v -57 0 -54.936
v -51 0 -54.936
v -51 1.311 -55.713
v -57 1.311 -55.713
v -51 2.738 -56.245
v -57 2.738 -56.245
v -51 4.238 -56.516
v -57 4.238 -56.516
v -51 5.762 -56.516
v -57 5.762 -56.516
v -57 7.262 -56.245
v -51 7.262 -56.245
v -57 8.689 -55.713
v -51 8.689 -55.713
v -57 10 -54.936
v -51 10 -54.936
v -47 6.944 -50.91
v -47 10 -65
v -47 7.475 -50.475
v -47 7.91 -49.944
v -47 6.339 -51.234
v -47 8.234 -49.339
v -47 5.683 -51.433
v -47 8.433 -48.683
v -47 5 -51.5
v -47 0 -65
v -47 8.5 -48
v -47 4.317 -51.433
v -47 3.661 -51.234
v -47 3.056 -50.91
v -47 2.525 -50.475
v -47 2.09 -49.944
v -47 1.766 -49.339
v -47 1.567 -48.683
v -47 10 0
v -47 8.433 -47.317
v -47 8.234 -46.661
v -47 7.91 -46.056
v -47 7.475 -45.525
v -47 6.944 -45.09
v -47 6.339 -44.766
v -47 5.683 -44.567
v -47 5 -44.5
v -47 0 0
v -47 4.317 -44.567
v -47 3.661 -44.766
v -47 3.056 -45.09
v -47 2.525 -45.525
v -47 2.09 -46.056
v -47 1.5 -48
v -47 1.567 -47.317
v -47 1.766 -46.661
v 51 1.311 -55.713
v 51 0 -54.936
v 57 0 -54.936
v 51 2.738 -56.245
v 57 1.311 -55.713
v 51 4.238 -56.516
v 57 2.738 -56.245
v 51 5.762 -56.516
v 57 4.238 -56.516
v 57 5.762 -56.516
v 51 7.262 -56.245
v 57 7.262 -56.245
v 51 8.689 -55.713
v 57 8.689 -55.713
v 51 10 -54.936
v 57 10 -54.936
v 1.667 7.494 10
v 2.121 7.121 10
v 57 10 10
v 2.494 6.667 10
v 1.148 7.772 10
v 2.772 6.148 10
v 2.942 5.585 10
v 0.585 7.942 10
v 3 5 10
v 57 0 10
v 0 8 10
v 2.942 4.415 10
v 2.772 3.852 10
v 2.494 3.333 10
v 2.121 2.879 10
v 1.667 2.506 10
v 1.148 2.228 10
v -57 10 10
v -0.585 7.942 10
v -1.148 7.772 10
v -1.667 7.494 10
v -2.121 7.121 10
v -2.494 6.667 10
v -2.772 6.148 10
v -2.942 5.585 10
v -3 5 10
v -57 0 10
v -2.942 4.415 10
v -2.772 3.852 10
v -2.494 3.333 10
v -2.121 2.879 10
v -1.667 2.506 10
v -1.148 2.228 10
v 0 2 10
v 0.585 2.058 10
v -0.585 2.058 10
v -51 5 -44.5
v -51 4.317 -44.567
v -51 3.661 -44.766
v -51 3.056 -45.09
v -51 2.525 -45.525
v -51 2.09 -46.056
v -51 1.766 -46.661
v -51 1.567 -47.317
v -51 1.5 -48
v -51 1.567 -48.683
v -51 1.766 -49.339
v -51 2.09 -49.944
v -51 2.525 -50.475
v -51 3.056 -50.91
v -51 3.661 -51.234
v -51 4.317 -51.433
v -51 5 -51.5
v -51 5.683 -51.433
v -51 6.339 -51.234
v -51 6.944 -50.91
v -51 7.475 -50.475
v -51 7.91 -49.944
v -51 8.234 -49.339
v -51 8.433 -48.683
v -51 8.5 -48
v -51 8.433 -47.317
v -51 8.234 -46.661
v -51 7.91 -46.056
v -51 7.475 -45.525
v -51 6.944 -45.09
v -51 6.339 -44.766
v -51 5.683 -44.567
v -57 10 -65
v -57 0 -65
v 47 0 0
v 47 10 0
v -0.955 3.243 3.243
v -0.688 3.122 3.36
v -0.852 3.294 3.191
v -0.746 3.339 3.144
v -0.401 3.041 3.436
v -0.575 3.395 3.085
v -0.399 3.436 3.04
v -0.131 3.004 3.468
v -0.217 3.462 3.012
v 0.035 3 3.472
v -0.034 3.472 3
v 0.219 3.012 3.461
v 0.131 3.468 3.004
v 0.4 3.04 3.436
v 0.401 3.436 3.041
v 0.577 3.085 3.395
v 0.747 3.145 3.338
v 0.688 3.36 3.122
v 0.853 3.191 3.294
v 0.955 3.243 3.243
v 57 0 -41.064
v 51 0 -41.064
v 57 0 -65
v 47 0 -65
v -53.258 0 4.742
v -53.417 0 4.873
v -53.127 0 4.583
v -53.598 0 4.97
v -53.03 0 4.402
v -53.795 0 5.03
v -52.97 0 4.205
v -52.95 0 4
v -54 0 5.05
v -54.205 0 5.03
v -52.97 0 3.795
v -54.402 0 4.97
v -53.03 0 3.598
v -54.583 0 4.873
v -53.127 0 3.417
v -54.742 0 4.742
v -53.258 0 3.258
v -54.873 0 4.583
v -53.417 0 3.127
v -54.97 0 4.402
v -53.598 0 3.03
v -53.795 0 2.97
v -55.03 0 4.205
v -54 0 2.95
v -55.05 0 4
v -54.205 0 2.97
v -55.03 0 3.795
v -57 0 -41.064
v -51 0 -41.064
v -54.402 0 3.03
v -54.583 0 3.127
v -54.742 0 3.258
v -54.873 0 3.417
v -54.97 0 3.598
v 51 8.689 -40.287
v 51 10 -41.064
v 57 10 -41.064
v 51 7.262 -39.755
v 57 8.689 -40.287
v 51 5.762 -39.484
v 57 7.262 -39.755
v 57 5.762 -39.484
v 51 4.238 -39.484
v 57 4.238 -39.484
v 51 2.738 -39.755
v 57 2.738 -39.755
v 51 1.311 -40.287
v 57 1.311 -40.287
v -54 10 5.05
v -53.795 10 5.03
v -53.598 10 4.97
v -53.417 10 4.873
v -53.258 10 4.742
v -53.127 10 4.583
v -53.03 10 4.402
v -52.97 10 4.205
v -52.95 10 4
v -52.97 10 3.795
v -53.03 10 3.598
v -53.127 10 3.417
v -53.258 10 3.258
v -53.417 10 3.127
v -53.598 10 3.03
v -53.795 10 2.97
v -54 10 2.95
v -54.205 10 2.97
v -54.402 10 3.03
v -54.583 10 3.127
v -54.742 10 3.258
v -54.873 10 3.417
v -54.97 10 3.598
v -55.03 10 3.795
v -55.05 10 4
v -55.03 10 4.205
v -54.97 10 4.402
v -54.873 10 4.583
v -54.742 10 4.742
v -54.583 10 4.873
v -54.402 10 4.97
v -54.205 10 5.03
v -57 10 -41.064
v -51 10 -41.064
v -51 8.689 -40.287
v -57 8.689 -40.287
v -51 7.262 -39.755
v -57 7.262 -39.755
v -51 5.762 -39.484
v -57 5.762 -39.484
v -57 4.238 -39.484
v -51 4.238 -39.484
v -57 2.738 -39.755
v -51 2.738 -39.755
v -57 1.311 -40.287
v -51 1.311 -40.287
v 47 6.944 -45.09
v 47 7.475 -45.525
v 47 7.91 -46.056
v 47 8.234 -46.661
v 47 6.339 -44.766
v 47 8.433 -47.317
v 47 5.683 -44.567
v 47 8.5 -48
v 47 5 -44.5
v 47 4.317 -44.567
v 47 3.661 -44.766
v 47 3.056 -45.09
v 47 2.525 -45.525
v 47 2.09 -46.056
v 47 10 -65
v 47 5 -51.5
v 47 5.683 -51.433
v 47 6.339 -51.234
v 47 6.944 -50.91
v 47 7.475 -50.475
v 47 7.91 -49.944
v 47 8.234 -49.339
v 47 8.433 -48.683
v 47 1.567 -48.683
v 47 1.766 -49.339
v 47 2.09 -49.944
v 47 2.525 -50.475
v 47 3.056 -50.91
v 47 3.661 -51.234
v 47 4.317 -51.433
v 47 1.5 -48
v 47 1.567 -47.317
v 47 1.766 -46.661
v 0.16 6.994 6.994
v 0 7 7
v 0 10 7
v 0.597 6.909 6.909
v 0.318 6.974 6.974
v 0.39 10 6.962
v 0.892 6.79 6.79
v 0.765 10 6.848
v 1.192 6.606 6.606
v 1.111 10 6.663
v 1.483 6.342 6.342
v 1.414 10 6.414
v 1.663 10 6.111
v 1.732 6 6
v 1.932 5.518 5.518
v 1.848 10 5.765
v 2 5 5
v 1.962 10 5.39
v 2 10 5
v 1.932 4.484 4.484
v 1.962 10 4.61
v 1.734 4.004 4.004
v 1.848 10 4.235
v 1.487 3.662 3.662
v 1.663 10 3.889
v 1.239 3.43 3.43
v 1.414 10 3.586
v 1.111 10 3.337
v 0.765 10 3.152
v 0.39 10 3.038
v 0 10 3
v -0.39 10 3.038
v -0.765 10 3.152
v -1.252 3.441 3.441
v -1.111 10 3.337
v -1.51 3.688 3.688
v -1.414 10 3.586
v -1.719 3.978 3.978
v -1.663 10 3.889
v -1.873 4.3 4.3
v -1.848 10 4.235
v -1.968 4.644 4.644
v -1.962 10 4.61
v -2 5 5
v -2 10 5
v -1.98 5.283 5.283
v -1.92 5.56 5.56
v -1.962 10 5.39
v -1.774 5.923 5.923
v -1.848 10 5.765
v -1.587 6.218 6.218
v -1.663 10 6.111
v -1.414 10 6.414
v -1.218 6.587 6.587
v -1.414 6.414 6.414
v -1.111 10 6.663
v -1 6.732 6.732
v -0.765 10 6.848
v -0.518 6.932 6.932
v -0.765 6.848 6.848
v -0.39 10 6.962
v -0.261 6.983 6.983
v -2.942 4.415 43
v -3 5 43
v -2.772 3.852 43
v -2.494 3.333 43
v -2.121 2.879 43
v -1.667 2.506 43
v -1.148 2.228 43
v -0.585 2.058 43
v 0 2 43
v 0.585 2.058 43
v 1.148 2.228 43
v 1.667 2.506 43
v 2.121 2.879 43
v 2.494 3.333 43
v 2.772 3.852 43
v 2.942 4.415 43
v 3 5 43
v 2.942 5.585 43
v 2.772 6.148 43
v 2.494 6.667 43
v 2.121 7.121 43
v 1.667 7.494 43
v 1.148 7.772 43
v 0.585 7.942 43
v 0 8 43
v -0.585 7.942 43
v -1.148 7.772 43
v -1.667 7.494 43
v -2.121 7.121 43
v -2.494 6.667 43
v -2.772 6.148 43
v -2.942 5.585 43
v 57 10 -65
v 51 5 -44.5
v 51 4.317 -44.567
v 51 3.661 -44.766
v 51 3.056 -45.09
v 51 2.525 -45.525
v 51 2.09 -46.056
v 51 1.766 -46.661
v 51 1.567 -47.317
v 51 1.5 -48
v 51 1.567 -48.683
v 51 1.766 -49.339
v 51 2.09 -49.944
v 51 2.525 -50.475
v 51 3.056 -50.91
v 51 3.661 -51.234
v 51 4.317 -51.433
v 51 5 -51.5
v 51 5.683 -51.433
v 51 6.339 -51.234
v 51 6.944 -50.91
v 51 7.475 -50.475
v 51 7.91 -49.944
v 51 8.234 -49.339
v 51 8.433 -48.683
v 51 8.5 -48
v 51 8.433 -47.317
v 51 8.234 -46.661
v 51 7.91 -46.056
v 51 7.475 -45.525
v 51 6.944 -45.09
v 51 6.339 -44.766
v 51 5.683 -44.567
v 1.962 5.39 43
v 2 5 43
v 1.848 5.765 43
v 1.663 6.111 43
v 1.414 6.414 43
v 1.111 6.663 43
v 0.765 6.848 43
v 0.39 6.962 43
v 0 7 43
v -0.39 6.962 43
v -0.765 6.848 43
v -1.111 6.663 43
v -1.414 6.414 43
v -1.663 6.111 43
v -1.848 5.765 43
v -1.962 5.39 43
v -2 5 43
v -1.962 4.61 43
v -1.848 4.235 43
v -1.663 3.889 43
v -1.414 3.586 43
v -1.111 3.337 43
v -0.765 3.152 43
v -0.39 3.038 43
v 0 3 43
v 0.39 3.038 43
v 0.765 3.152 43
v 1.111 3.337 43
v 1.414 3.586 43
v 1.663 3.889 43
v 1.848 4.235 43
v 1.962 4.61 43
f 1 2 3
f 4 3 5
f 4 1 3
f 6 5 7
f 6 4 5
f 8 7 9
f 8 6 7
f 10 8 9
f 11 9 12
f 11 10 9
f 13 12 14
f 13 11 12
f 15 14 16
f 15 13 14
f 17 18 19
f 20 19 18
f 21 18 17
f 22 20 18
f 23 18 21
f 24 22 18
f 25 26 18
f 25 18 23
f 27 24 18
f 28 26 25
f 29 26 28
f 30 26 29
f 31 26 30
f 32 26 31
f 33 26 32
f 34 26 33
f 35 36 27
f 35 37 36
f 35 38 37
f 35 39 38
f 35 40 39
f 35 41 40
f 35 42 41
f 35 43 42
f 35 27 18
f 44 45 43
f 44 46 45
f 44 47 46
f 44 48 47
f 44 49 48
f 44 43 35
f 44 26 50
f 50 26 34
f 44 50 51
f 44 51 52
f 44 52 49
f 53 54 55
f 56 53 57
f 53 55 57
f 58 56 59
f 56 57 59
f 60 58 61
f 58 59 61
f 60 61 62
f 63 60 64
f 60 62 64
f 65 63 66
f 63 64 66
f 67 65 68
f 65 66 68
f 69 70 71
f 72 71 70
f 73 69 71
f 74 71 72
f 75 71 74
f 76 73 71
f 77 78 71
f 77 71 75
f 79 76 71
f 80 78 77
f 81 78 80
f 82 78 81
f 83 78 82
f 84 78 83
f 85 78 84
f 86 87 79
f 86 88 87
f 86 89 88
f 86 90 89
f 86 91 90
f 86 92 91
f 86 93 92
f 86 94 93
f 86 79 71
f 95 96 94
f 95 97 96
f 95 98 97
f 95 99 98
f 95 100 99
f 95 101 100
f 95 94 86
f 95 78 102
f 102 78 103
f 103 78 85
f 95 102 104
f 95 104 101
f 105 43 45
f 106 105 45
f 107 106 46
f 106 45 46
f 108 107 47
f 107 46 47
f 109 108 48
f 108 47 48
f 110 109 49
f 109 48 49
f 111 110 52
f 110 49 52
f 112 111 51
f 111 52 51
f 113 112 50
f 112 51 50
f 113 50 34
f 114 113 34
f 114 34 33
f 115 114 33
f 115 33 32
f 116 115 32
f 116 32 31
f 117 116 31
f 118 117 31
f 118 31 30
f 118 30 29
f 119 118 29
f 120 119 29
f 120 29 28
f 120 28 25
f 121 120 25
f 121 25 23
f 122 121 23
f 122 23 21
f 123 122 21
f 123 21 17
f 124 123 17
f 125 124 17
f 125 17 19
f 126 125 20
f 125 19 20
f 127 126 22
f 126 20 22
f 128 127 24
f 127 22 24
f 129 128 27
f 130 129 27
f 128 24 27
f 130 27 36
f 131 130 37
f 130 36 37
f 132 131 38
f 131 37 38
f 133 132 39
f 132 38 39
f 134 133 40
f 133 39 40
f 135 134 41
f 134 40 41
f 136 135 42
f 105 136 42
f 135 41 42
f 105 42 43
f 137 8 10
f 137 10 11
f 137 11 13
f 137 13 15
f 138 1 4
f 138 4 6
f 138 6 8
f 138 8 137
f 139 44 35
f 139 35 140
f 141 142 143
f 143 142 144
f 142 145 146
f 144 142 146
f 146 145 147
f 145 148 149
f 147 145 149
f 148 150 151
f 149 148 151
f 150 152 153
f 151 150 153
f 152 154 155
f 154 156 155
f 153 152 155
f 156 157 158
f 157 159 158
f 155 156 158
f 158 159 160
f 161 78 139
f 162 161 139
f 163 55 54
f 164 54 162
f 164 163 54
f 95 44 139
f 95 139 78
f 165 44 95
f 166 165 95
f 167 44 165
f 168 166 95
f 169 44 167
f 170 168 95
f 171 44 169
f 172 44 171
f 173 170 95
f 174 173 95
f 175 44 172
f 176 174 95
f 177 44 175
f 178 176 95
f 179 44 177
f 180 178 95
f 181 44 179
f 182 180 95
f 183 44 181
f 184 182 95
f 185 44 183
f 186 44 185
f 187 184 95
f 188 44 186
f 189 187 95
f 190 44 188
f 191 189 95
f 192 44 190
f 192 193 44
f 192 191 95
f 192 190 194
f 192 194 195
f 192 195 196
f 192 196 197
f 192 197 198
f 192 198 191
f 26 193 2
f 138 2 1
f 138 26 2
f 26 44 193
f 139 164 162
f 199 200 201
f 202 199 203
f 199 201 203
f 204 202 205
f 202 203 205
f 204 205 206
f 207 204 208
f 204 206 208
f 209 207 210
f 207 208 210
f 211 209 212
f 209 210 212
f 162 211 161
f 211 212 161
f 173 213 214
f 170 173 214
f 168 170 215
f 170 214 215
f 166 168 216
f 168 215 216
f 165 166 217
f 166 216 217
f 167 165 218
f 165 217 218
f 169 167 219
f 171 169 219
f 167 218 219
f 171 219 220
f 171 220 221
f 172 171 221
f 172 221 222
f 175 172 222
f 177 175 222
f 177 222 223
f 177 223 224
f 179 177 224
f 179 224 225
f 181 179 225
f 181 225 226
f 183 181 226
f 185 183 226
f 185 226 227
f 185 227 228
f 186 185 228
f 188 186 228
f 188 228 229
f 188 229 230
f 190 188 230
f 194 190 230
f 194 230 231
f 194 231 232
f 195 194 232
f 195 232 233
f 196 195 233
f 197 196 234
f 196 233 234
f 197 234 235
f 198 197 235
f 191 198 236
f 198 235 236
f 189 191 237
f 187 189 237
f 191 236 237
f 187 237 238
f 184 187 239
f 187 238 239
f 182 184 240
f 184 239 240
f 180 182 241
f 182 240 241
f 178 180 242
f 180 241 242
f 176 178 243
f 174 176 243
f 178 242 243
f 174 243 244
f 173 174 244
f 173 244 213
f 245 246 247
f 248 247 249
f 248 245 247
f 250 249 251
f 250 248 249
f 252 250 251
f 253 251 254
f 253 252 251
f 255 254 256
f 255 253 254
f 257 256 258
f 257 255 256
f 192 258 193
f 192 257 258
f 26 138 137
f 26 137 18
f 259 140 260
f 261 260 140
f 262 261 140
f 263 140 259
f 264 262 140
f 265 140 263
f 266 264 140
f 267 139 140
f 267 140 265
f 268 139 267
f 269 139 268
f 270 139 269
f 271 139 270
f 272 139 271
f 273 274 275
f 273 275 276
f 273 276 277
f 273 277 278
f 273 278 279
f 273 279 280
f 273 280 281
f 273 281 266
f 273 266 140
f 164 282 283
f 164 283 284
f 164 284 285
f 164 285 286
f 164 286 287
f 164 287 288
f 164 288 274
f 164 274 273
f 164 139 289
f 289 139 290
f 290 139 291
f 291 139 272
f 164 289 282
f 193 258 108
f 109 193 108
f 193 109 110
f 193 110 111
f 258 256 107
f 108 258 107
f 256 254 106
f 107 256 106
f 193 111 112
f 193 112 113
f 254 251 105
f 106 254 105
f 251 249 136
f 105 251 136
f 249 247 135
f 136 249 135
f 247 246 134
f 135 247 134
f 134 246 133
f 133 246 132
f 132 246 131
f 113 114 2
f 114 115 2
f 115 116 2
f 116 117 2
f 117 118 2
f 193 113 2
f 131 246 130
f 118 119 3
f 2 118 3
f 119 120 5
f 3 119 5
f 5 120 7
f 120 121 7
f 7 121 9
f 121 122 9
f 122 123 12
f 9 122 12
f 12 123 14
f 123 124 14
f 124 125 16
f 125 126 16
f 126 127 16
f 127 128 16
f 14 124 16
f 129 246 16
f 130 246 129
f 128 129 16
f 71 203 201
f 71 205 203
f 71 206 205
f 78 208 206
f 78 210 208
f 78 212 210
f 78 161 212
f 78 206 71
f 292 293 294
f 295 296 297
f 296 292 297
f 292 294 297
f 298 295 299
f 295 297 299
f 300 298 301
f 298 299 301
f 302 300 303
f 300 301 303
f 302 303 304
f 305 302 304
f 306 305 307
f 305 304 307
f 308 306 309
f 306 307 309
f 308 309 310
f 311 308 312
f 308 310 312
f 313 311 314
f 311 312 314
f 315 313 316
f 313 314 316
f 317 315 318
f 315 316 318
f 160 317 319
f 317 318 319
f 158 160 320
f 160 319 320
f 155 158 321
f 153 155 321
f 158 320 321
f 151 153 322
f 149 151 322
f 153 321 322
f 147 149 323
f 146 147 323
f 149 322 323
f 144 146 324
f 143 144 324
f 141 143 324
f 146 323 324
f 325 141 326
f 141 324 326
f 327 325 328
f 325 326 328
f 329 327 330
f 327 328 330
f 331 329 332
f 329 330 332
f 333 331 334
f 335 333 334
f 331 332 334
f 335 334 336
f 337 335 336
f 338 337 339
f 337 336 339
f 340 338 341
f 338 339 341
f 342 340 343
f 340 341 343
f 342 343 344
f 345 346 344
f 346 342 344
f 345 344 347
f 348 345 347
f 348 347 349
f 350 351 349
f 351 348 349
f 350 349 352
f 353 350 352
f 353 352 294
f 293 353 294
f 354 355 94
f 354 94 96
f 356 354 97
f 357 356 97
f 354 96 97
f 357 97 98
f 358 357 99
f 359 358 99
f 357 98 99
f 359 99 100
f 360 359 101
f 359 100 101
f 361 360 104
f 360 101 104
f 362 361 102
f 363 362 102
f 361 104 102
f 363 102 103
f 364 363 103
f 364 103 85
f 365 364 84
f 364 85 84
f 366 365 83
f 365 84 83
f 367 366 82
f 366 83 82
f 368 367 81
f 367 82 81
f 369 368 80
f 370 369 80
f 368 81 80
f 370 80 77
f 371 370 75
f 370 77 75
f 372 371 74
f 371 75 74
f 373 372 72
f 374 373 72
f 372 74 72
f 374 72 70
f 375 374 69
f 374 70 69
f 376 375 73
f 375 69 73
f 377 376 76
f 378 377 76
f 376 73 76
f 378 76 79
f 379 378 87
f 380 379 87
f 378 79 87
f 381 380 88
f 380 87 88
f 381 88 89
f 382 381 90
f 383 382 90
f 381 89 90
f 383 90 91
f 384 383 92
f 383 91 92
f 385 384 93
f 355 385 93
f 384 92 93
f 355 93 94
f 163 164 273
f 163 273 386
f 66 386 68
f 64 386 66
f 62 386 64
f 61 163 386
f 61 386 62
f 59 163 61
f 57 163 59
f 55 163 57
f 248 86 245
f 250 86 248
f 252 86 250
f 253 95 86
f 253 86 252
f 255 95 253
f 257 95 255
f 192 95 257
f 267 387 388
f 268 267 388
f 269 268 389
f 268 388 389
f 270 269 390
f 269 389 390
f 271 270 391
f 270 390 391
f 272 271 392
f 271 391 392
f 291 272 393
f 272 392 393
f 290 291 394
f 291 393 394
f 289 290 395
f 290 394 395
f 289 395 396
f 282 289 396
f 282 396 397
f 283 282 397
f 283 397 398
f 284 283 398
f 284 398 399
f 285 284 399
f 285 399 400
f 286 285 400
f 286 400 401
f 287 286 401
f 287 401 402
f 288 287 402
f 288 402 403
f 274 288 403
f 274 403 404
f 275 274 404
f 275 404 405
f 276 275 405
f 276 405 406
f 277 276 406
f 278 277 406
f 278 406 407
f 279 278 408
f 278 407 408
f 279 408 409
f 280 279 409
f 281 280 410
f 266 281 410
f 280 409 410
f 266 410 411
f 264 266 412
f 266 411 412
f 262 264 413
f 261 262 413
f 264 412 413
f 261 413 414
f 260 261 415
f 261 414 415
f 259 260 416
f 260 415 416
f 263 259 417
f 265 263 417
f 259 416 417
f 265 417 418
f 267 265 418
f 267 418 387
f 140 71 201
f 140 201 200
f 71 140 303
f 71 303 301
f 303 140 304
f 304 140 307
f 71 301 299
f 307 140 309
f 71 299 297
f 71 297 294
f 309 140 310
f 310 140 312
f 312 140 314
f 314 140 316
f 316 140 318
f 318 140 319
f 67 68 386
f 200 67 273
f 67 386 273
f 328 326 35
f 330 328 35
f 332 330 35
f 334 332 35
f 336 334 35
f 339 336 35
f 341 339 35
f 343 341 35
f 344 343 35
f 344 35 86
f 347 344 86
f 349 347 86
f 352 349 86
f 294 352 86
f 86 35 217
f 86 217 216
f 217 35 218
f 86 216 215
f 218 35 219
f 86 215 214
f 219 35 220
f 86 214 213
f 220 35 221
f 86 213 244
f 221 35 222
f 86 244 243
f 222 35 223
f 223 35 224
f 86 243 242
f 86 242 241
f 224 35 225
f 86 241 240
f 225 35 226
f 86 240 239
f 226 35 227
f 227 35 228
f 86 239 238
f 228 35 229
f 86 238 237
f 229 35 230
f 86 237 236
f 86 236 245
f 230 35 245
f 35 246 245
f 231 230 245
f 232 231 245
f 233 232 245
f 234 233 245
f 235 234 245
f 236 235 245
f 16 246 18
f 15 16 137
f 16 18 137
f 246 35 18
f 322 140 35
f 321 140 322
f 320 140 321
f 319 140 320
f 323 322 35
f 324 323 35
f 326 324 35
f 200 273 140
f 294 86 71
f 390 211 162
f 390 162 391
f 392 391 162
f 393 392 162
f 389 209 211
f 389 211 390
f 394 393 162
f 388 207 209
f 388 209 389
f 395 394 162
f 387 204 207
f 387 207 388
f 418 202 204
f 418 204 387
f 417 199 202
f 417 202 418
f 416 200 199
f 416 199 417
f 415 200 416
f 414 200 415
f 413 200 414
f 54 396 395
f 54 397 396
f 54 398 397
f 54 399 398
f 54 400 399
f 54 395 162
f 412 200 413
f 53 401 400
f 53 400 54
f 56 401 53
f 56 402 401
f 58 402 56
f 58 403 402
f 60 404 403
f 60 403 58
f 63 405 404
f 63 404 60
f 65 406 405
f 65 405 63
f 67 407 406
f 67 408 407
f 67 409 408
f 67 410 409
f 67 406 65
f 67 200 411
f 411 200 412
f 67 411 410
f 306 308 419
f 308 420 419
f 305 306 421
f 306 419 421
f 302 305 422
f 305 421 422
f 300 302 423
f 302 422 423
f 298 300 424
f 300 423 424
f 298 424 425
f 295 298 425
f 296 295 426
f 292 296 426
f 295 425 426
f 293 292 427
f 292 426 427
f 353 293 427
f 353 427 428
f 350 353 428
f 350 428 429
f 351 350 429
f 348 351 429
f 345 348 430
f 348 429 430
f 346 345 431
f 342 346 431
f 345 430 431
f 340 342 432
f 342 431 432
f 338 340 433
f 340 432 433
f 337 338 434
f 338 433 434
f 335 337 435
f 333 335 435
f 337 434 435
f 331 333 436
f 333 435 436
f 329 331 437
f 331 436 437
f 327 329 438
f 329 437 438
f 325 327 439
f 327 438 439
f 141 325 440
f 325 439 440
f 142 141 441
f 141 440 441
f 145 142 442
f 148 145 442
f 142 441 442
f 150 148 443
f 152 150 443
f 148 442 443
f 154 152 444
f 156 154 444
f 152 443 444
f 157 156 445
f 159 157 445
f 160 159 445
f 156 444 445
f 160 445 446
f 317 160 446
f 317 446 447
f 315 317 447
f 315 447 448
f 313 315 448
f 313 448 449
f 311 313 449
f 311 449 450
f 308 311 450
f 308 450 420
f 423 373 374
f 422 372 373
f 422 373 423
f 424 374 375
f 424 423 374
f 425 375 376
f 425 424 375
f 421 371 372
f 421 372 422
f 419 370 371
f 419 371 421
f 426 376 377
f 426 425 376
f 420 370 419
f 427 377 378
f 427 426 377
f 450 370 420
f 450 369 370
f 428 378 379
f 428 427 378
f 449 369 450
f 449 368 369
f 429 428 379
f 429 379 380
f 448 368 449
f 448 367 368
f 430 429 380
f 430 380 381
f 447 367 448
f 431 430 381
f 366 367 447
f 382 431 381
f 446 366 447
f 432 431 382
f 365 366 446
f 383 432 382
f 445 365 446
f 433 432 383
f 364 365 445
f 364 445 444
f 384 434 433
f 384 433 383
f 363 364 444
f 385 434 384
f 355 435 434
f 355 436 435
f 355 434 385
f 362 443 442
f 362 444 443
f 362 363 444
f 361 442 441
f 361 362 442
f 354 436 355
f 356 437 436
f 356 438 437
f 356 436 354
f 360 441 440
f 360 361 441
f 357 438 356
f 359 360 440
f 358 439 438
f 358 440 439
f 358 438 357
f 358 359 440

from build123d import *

# Parameters (mm, degrees)
BOSS_EXTRUDE1_DEPTH = 10
SKETCH2_R           = 8.55
CUT_EXTRUDE1_DEPTH  = 6
SKETCH3_R           = 3.5
CUT_EXTRUDE2_DEPTH  = 127.447617613
SKETCH4_R           = 3
BOSS_EXTRUDE2_DEPTH = 33
SKETCH5_R           = 1.05
CUT_EXTRUDE3_DEPTH  = 88.028730888
SKETCH6_R           = 2
CUT_EXTRUDE4_DEPTH  = 38
SKETCH7_R           = 2
CUT_EXTRUDE5_DEPTH  = 5
FILLET2_R           = 6


with BuildPart() as part:
    # Sketch1 → Boss-Extrude1 (new body)
    with BuildSketch(Plane(origin=(0, 0, 0), x_dir=(1, 0, 0), z_dir=(0, 1, 0))):
        Polygon((-47, 0), (47, 0), (47, 65), (57, 65), (57, -10), (-57, -10), (-57, 65), (-47, 65), align=None)
    extrude(amount=BOSS_EXTRUDE1_DEPTH)

    # Sketch2 → Cut-Extrude1 (cut)
    with BuildSketch(Plane(origin=(57, 0, 0), x_dir=(0, 0, -1), z_dir=(1, 0, 0))):
        with Locations((48, 5)):
            Circle(SKETCH2_R)
    cut_extrude1 = extrude(amount=-CUT_EXTRUDE1_DEPTH, mode=Mode.SUBTRACT)

    # Mirror1: Cut-Extrude1 across plane
    add(cut_extrude1.mirror(Plane(origin=(0, 0, 0), x_dir=(0, 0, 1), z_dir=(1, 0, 0))), mode=Mode.SUBTRACT)

    # Sketch3 → Cut-Extrude2 (cut, through all)
    with BuildSketch(Plane(origin=(51, 0, 0), x_dir=(0, 0, -1), z_dir=(1, 0, 0))):
        with Locations(Location((48, 5, 0), (0, 0, 180))):
            Circle(SKETCH3_R)
    extrude(amount=-CUT_EXTRUDE2_DEPTH, mode=Mode.SUBTRACT)

    # Sketch4 → Boss-Extrude2 (add)
    with BuildSketch(Plane.XY.offset(10)):
        with Locations(Location((0, 5, 0), (0, 0, 180))):
            Circle(SKETCH4_R)
    extrude(amount=BOSS_EXTRUDE2_DEPTH)

    # Sketch5 → Cut-Extrude3 (cut, through all)
    with BuildSketch(Plane(origin=(0, 10, 0), x_dir=(1, 0, 0), z_dir=(0, 1, 0))):
        with Locations(Location((-54, -4, 0), (0, 0, 270))):
            Circle(SKETCH5_R)
    extrude(amount=-CUT_EXTRUDE3_DEPTH, mode=Mode.SUBTRACT)

    # Sketch6 → Cut-Extrude4 (cut)
    with BuildSketch(Plane.XY.offset(43)):
        with Locations((0, 5)):
            Circle(SKETCH6_R)
    extrude(amount=-CUT_EXTRUDE4_DEPTH, mode=Mode.SUBTRACT)

    # Sketch7 → Cut-Extrude5 (cut)
    with BuildSketch(Plane(origin=(0, 10, 0), x_dir=(1, 0, 0), z_dir=(0, 1, 0))):
        with Locations(Location((0, -5, 0), (0, 0, 270))):
            Circle(SKETCH7_R)
    extrude(amount=-CUT_EXTRUDE5_DEPTH, mode=Mode.SUBTRACT)

    # Fillet2
    # the kernel refuses this fillet: 6 mm, written as the material it takes off along each edge
    with BuildSketch(Plane(origin=(17, 5, 5), x_dir=(0, 0, -1), z_dir=(-1, 0, 0))) as fillet2_piece_1_section:
        with BuildLine():
            CenterArc((FILLET2_R, FILLET2_R), FILLET2_R, 180, 90)
            Line((0, FILLET2_R), (0, 0))
            Line((0, 0), (FILLET2_R, 0))
        make_face()
    fillet2_piece_1 = extrude(amount=34, mode=Mode.PRIVATE)
    fillet2_piece_1 = fillet2_piece_1 & Plane(origin=(0, 4.127189323, 5), x_dir=(0, 0, 1), z_dir=(0, 1, 0)) * Cylinder(2, 92, mode=Mode.PRIVATE)
    fillet2_piece_1 = fillet2_piece_1 & Plane(origin=(0, 5, 4.127189323), x_dir=(1, 0, 0), z_dir=(0, 0, 1)) * Cylinder(2, 92, mode=Mode.PRIVATE)
    add(fillet2_piece_1, mode=Mode.SUBTRACT)


solid = part.part
